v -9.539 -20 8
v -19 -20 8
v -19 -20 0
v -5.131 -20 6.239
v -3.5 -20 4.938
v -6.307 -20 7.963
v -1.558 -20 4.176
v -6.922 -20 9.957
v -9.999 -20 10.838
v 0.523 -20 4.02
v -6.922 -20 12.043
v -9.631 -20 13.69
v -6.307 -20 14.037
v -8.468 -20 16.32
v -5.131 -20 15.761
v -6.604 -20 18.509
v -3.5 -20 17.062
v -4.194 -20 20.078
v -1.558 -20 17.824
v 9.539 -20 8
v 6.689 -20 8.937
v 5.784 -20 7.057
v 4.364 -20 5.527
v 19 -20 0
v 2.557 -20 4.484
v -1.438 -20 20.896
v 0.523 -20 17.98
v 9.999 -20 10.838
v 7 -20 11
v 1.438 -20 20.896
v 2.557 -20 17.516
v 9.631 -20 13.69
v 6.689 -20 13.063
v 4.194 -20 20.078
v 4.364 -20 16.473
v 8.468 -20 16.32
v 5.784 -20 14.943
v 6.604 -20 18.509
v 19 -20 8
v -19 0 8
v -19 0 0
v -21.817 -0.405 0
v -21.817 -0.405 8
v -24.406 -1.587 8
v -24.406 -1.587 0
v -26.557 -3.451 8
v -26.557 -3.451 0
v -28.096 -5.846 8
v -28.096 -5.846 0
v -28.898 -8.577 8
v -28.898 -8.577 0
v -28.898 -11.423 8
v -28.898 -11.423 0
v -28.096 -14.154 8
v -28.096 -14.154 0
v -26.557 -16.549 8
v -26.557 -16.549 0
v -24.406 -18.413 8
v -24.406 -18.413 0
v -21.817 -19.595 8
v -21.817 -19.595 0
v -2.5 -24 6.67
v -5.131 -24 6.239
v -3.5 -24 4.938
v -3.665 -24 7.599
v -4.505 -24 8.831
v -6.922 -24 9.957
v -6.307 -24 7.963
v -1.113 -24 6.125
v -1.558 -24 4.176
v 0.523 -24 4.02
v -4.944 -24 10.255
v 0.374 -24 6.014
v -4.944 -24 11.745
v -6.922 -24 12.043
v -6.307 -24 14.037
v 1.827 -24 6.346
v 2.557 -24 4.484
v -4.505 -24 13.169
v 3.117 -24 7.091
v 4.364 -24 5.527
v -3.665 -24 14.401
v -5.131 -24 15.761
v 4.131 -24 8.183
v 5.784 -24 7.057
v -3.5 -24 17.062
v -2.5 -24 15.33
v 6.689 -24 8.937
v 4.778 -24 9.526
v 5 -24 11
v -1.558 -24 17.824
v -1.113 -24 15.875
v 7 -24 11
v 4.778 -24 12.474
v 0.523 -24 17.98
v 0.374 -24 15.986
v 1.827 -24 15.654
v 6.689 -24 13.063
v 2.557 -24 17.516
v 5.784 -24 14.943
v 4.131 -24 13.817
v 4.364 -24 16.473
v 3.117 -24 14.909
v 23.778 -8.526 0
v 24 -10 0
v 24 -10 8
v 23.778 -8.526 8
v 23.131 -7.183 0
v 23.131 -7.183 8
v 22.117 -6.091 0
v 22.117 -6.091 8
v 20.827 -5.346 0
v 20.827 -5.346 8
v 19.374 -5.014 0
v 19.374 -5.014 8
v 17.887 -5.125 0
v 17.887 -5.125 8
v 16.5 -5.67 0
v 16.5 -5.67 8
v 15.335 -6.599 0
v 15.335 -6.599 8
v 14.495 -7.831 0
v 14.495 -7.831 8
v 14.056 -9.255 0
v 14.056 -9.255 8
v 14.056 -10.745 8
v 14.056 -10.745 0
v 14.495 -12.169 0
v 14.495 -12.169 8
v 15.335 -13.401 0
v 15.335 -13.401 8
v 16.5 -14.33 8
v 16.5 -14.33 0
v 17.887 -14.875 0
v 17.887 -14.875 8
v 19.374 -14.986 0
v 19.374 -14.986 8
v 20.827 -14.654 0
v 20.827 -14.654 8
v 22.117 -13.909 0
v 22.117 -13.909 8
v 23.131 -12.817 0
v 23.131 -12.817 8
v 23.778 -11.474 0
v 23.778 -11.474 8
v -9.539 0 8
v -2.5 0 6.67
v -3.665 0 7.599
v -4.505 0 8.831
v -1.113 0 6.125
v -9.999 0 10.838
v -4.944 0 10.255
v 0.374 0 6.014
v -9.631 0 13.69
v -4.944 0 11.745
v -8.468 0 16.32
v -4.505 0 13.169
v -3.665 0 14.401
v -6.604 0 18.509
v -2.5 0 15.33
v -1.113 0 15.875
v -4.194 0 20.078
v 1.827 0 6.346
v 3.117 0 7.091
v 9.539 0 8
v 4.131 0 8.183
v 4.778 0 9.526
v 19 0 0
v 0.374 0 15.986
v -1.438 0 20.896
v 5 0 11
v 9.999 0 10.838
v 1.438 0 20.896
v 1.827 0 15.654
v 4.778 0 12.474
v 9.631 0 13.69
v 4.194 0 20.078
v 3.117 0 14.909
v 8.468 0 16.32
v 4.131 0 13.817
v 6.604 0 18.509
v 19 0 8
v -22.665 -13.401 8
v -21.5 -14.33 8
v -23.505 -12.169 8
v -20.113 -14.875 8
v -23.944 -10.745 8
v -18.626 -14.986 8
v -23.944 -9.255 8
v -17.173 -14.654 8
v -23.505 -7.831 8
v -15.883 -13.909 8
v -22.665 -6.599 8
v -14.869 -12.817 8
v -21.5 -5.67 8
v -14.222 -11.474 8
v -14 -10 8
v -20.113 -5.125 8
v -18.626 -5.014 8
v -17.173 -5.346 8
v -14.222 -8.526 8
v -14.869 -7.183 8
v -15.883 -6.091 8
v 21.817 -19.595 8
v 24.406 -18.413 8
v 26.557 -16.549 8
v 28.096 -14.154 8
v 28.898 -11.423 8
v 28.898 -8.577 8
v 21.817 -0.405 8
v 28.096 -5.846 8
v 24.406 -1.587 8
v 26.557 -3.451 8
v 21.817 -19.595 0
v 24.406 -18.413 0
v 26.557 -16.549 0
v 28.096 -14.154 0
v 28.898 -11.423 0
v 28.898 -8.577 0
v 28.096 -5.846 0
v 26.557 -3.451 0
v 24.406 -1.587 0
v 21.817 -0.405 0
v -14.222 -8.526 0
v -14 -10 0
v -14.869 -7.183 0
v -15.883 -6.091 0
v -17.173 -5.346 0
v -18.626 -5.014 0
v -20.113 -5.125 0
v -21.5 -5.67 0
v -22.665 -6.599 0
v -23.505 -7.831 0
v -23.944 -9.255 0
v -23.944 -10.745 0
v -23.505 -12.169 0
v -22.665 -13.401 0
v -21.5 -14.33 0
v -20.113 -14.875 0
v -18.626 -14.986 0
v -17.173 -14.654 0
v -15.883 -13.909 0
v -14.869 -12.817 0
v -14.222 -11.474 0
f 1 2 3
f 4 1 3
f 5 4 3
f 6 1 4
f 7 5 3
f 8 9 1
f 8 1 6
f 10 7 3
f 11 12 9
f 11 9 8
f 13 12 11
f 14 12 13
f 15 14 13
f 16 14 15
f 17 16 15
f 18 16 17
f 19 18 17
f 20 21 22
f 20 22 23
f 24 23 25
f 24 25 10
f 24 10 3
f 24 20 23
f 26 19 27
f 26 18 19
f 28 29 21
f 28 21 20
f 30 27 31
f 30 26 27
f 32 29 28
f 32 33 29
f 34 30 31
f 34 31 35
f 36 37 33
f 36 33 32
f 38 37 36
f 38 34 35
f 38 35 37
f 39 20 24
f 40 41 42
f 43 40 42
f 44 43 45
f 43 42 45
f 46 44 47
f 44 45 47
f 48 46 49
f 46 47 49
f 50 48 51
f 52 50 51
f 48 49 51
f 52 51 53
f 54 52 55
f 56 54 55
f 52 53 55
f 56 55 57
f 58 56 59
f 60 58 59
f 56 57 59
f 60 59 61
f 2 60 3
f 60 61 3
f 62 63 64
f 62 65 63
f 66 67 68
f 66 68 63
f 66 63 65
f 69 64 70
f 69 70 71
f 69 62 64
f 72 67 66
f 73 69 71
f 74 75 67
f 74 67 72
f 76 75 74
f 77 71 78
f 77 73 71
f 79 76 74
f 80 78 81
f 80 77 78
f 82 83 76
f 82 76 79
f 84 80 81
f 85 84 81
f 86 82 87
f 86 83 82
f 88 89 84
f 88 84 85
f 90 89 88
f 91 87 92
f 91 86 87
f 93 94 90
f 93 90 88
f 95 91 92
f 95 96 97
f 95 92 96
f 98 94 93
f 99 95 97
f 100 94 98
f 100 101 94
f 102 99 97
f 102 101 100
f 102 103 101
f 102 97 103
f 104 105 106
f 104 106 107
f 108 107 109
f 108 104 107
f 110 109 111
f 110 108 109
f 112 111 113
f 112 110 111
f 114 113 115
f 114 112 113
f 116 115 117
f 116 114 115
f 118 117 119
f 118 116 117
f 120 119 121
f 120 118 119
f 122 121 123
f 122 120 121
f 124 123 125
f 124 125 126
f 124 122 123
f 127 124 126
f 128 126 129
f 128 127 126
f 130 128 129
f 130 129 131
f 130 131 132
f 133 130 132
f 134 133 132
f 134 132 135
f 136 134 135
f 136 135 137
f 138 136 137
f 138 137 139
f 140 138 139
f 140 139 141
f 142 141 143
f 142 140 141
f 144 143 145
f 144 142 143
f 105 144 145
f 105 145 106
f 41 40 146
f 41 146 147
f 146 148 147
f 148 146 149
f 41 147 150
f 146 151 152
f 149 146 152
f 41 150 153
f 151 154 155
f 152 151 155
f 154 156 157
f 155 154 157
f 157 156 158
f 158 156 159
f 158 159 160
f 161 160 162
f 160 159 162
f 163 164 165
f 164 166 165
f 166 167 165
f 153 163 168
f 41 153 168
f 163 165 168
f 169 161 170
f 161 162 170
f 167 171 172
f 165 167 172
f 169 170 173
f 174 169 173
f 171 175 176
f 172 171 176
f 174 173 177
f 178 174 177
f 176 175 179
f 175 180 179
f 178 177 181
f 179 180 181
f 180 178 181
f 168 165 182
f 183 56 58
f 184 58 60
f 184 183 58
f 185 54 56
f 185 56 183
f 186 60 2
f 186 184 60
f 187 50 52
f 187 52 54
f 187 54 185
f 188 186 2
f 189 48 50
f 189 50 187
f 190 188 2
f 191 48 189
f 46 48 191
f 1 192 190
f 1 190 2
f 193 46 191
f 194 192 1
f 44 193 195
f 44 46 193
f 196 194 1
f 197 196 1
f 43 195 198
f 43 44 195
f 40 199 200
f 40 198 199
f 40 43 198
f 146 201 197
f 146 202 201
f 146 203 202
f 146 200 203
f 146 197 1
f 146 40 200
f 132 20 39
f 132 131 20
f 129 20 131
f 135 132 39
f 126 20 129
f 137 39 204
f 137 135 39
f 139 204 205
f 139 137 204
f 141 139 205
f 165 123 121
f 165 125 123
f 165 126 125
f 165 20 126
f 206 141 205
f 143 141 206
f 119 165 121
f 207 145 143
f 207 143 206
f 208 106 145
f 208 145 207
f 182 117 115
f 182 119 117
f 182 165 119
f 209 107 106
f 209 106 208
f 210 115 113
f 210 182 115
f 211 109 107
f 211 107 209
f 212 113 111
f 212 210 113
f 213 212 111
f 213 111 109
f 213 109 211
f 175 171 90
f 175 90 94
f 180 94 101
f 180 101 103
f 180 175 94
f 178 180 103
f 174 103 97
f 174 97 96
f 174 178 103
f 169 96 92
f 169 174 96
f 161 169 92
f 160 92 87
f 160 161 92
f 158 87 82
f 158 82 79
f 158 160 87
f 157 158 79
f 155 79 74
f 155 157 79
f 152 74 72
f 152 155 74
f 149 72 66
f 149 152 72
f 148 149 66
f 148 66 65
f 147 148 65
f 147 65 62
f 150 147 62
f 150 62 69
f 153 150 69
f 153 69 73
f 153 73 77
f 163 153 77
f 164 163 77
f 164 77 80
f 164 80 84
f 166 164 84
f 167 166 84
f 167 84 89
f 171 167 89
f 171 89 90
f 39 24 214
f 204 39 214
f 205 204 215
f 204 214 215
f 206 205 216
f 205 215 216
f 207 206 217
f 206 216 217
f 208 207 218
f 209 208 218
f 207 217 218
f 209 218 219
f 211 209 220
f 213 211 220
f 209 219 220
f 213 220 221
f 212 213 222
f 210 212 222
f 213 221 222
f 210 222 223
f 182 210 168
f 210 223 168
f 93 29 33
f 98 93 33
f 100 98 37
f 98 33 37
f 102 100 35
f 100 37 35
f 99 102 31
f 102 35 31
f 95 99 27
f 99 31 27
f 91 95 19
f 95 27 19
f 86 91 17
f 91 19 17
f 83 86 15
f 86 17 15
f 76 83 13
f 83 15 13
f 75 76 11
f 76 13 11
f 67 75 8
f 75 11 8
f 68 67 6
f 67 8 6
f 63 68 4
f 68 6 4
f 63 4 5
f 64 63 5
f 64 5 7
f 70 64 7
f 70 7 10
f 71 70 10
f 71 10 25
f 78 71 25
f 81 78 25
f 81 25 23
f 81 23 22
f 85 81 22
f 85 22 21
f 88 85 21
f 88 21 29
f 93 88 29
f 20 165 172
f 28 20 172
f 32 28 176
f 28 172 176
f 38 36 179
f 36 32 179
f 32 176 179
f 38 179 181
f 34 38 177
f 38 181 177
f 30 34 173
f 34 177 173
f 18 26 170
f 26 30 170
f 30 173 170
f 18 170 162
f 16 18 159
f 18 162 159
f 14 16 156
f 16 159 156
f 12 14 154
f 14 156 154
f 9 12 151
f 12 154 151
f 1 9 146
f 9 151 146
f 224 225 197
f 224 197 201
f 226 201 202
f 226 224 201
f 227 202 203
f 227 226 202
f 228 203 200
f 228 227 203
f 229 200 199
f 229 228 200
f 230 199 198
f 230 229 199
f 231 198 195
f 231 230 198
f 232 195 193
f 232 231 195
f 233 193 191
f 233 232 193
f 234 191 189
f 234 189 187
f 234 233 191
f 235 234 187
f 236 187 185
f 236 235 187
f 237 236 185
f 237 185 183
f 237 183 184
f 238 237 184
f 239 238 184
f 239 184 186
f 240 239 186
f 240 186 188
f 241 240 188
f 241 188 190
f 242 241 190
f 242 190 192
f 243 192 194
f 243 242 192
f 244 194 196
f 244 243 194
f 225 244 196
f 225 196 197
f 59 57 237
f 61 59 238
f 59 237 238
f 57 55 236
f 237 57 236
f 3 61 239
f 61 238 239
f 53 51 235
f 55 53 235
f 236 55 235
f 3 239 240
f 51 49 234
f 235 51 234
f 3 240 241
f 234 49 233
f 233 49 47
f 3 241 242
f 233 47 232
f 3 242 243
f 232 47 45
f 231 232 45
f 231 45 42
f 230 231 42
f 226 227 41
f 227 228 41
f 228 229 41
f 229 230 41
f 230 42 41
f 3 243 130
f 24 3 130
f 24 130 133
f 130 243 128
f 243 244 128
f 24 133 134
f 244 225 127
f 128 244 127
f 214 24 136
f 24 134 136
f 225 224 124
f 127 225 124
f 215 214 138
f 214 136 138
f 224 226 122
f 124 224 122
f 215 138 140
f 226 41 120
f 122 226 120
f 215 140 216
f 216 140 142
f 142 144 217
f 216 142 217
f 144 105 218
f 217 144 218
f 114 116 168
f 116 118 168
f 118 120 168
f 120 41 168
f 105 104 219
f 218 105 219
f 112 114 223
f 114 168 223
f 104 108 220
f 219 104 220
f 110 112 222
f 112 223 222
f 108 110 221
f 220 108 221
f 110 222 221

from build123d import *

# Parameters (mm, degrees)
F0_R     = 5
F1_DEPTH = 8
F2_R     = 7
F3_DEPTH = 20
F2_R_2   = 5
F4_DEPTH = 24
F5_D     = 10
F5_DEPTH = 20
F5_TIP   = 3.0043030951


with BuildPart() as f1:
    # F0 (on Top) → F1 (new body)
    with BuildSketch(Plane.XY):
        with BuildLine():
            Line((19, 0), (0, 0))
            Line((0, 0), (-19, 0))
            ThreePointArc((-19, 0), (-29, -10), (-19, -20))
            Line((-19, -20), (0, -20))
            Line((0, -20), (19, -20))
            ThreePointArc((19, -20), (29, -10), (19, 0))
        make_face()
        with Locations((-19, -10)):
            Circle(F0_R, mode=Mode.SUBTRACT)
        with Locations((19, -10)):
            Circle(F0_R, mode=Mode.SUBTRACT)
    extrude(amount=F1_DEPTH)

    # F2 (on Front) → F3 (join)
    with BuildSketch(Plane.XZ):
        with BuildLine():
            ThreePointArc((-10, 11), (0, 1), (10, 11))
            ThreePointArc((10, 11), (0, 21), (-10, 11))
        make_face()
        with Locations((0, 11)):
            Circle(F2_R, mode=Mode.SUBTRACT)
    extrude(amount=F3_DEPTH)

    # F2 (on Front) → F4 (join)
    with BuildSketch(Plane.XZ):
        with Locations((0, 11)):
            Circle(F2_R)
        with Locations((0, 11)):
            Circle(F2_R_2, mode=Mode.SUBTRACT)
    extrude(amount=F4_DEPTH)

    # F5
    with Locations(Plane(origin=(0, 0, 0), x_dir=(1, 0, 0), z_dir=(0, 1, 0))):
        with Locations((0, -11)):
            Hole(F5_D / 2, depth=F5_DEPTH)
            with Locations((0, 0, -(F5_DEPTH + F5_TIP / 2))):  # 118° drill point
                Cone(0, F5_D / 2, F5_TIP, mode=Mode.SUBTRACT)


solid = f1.part
